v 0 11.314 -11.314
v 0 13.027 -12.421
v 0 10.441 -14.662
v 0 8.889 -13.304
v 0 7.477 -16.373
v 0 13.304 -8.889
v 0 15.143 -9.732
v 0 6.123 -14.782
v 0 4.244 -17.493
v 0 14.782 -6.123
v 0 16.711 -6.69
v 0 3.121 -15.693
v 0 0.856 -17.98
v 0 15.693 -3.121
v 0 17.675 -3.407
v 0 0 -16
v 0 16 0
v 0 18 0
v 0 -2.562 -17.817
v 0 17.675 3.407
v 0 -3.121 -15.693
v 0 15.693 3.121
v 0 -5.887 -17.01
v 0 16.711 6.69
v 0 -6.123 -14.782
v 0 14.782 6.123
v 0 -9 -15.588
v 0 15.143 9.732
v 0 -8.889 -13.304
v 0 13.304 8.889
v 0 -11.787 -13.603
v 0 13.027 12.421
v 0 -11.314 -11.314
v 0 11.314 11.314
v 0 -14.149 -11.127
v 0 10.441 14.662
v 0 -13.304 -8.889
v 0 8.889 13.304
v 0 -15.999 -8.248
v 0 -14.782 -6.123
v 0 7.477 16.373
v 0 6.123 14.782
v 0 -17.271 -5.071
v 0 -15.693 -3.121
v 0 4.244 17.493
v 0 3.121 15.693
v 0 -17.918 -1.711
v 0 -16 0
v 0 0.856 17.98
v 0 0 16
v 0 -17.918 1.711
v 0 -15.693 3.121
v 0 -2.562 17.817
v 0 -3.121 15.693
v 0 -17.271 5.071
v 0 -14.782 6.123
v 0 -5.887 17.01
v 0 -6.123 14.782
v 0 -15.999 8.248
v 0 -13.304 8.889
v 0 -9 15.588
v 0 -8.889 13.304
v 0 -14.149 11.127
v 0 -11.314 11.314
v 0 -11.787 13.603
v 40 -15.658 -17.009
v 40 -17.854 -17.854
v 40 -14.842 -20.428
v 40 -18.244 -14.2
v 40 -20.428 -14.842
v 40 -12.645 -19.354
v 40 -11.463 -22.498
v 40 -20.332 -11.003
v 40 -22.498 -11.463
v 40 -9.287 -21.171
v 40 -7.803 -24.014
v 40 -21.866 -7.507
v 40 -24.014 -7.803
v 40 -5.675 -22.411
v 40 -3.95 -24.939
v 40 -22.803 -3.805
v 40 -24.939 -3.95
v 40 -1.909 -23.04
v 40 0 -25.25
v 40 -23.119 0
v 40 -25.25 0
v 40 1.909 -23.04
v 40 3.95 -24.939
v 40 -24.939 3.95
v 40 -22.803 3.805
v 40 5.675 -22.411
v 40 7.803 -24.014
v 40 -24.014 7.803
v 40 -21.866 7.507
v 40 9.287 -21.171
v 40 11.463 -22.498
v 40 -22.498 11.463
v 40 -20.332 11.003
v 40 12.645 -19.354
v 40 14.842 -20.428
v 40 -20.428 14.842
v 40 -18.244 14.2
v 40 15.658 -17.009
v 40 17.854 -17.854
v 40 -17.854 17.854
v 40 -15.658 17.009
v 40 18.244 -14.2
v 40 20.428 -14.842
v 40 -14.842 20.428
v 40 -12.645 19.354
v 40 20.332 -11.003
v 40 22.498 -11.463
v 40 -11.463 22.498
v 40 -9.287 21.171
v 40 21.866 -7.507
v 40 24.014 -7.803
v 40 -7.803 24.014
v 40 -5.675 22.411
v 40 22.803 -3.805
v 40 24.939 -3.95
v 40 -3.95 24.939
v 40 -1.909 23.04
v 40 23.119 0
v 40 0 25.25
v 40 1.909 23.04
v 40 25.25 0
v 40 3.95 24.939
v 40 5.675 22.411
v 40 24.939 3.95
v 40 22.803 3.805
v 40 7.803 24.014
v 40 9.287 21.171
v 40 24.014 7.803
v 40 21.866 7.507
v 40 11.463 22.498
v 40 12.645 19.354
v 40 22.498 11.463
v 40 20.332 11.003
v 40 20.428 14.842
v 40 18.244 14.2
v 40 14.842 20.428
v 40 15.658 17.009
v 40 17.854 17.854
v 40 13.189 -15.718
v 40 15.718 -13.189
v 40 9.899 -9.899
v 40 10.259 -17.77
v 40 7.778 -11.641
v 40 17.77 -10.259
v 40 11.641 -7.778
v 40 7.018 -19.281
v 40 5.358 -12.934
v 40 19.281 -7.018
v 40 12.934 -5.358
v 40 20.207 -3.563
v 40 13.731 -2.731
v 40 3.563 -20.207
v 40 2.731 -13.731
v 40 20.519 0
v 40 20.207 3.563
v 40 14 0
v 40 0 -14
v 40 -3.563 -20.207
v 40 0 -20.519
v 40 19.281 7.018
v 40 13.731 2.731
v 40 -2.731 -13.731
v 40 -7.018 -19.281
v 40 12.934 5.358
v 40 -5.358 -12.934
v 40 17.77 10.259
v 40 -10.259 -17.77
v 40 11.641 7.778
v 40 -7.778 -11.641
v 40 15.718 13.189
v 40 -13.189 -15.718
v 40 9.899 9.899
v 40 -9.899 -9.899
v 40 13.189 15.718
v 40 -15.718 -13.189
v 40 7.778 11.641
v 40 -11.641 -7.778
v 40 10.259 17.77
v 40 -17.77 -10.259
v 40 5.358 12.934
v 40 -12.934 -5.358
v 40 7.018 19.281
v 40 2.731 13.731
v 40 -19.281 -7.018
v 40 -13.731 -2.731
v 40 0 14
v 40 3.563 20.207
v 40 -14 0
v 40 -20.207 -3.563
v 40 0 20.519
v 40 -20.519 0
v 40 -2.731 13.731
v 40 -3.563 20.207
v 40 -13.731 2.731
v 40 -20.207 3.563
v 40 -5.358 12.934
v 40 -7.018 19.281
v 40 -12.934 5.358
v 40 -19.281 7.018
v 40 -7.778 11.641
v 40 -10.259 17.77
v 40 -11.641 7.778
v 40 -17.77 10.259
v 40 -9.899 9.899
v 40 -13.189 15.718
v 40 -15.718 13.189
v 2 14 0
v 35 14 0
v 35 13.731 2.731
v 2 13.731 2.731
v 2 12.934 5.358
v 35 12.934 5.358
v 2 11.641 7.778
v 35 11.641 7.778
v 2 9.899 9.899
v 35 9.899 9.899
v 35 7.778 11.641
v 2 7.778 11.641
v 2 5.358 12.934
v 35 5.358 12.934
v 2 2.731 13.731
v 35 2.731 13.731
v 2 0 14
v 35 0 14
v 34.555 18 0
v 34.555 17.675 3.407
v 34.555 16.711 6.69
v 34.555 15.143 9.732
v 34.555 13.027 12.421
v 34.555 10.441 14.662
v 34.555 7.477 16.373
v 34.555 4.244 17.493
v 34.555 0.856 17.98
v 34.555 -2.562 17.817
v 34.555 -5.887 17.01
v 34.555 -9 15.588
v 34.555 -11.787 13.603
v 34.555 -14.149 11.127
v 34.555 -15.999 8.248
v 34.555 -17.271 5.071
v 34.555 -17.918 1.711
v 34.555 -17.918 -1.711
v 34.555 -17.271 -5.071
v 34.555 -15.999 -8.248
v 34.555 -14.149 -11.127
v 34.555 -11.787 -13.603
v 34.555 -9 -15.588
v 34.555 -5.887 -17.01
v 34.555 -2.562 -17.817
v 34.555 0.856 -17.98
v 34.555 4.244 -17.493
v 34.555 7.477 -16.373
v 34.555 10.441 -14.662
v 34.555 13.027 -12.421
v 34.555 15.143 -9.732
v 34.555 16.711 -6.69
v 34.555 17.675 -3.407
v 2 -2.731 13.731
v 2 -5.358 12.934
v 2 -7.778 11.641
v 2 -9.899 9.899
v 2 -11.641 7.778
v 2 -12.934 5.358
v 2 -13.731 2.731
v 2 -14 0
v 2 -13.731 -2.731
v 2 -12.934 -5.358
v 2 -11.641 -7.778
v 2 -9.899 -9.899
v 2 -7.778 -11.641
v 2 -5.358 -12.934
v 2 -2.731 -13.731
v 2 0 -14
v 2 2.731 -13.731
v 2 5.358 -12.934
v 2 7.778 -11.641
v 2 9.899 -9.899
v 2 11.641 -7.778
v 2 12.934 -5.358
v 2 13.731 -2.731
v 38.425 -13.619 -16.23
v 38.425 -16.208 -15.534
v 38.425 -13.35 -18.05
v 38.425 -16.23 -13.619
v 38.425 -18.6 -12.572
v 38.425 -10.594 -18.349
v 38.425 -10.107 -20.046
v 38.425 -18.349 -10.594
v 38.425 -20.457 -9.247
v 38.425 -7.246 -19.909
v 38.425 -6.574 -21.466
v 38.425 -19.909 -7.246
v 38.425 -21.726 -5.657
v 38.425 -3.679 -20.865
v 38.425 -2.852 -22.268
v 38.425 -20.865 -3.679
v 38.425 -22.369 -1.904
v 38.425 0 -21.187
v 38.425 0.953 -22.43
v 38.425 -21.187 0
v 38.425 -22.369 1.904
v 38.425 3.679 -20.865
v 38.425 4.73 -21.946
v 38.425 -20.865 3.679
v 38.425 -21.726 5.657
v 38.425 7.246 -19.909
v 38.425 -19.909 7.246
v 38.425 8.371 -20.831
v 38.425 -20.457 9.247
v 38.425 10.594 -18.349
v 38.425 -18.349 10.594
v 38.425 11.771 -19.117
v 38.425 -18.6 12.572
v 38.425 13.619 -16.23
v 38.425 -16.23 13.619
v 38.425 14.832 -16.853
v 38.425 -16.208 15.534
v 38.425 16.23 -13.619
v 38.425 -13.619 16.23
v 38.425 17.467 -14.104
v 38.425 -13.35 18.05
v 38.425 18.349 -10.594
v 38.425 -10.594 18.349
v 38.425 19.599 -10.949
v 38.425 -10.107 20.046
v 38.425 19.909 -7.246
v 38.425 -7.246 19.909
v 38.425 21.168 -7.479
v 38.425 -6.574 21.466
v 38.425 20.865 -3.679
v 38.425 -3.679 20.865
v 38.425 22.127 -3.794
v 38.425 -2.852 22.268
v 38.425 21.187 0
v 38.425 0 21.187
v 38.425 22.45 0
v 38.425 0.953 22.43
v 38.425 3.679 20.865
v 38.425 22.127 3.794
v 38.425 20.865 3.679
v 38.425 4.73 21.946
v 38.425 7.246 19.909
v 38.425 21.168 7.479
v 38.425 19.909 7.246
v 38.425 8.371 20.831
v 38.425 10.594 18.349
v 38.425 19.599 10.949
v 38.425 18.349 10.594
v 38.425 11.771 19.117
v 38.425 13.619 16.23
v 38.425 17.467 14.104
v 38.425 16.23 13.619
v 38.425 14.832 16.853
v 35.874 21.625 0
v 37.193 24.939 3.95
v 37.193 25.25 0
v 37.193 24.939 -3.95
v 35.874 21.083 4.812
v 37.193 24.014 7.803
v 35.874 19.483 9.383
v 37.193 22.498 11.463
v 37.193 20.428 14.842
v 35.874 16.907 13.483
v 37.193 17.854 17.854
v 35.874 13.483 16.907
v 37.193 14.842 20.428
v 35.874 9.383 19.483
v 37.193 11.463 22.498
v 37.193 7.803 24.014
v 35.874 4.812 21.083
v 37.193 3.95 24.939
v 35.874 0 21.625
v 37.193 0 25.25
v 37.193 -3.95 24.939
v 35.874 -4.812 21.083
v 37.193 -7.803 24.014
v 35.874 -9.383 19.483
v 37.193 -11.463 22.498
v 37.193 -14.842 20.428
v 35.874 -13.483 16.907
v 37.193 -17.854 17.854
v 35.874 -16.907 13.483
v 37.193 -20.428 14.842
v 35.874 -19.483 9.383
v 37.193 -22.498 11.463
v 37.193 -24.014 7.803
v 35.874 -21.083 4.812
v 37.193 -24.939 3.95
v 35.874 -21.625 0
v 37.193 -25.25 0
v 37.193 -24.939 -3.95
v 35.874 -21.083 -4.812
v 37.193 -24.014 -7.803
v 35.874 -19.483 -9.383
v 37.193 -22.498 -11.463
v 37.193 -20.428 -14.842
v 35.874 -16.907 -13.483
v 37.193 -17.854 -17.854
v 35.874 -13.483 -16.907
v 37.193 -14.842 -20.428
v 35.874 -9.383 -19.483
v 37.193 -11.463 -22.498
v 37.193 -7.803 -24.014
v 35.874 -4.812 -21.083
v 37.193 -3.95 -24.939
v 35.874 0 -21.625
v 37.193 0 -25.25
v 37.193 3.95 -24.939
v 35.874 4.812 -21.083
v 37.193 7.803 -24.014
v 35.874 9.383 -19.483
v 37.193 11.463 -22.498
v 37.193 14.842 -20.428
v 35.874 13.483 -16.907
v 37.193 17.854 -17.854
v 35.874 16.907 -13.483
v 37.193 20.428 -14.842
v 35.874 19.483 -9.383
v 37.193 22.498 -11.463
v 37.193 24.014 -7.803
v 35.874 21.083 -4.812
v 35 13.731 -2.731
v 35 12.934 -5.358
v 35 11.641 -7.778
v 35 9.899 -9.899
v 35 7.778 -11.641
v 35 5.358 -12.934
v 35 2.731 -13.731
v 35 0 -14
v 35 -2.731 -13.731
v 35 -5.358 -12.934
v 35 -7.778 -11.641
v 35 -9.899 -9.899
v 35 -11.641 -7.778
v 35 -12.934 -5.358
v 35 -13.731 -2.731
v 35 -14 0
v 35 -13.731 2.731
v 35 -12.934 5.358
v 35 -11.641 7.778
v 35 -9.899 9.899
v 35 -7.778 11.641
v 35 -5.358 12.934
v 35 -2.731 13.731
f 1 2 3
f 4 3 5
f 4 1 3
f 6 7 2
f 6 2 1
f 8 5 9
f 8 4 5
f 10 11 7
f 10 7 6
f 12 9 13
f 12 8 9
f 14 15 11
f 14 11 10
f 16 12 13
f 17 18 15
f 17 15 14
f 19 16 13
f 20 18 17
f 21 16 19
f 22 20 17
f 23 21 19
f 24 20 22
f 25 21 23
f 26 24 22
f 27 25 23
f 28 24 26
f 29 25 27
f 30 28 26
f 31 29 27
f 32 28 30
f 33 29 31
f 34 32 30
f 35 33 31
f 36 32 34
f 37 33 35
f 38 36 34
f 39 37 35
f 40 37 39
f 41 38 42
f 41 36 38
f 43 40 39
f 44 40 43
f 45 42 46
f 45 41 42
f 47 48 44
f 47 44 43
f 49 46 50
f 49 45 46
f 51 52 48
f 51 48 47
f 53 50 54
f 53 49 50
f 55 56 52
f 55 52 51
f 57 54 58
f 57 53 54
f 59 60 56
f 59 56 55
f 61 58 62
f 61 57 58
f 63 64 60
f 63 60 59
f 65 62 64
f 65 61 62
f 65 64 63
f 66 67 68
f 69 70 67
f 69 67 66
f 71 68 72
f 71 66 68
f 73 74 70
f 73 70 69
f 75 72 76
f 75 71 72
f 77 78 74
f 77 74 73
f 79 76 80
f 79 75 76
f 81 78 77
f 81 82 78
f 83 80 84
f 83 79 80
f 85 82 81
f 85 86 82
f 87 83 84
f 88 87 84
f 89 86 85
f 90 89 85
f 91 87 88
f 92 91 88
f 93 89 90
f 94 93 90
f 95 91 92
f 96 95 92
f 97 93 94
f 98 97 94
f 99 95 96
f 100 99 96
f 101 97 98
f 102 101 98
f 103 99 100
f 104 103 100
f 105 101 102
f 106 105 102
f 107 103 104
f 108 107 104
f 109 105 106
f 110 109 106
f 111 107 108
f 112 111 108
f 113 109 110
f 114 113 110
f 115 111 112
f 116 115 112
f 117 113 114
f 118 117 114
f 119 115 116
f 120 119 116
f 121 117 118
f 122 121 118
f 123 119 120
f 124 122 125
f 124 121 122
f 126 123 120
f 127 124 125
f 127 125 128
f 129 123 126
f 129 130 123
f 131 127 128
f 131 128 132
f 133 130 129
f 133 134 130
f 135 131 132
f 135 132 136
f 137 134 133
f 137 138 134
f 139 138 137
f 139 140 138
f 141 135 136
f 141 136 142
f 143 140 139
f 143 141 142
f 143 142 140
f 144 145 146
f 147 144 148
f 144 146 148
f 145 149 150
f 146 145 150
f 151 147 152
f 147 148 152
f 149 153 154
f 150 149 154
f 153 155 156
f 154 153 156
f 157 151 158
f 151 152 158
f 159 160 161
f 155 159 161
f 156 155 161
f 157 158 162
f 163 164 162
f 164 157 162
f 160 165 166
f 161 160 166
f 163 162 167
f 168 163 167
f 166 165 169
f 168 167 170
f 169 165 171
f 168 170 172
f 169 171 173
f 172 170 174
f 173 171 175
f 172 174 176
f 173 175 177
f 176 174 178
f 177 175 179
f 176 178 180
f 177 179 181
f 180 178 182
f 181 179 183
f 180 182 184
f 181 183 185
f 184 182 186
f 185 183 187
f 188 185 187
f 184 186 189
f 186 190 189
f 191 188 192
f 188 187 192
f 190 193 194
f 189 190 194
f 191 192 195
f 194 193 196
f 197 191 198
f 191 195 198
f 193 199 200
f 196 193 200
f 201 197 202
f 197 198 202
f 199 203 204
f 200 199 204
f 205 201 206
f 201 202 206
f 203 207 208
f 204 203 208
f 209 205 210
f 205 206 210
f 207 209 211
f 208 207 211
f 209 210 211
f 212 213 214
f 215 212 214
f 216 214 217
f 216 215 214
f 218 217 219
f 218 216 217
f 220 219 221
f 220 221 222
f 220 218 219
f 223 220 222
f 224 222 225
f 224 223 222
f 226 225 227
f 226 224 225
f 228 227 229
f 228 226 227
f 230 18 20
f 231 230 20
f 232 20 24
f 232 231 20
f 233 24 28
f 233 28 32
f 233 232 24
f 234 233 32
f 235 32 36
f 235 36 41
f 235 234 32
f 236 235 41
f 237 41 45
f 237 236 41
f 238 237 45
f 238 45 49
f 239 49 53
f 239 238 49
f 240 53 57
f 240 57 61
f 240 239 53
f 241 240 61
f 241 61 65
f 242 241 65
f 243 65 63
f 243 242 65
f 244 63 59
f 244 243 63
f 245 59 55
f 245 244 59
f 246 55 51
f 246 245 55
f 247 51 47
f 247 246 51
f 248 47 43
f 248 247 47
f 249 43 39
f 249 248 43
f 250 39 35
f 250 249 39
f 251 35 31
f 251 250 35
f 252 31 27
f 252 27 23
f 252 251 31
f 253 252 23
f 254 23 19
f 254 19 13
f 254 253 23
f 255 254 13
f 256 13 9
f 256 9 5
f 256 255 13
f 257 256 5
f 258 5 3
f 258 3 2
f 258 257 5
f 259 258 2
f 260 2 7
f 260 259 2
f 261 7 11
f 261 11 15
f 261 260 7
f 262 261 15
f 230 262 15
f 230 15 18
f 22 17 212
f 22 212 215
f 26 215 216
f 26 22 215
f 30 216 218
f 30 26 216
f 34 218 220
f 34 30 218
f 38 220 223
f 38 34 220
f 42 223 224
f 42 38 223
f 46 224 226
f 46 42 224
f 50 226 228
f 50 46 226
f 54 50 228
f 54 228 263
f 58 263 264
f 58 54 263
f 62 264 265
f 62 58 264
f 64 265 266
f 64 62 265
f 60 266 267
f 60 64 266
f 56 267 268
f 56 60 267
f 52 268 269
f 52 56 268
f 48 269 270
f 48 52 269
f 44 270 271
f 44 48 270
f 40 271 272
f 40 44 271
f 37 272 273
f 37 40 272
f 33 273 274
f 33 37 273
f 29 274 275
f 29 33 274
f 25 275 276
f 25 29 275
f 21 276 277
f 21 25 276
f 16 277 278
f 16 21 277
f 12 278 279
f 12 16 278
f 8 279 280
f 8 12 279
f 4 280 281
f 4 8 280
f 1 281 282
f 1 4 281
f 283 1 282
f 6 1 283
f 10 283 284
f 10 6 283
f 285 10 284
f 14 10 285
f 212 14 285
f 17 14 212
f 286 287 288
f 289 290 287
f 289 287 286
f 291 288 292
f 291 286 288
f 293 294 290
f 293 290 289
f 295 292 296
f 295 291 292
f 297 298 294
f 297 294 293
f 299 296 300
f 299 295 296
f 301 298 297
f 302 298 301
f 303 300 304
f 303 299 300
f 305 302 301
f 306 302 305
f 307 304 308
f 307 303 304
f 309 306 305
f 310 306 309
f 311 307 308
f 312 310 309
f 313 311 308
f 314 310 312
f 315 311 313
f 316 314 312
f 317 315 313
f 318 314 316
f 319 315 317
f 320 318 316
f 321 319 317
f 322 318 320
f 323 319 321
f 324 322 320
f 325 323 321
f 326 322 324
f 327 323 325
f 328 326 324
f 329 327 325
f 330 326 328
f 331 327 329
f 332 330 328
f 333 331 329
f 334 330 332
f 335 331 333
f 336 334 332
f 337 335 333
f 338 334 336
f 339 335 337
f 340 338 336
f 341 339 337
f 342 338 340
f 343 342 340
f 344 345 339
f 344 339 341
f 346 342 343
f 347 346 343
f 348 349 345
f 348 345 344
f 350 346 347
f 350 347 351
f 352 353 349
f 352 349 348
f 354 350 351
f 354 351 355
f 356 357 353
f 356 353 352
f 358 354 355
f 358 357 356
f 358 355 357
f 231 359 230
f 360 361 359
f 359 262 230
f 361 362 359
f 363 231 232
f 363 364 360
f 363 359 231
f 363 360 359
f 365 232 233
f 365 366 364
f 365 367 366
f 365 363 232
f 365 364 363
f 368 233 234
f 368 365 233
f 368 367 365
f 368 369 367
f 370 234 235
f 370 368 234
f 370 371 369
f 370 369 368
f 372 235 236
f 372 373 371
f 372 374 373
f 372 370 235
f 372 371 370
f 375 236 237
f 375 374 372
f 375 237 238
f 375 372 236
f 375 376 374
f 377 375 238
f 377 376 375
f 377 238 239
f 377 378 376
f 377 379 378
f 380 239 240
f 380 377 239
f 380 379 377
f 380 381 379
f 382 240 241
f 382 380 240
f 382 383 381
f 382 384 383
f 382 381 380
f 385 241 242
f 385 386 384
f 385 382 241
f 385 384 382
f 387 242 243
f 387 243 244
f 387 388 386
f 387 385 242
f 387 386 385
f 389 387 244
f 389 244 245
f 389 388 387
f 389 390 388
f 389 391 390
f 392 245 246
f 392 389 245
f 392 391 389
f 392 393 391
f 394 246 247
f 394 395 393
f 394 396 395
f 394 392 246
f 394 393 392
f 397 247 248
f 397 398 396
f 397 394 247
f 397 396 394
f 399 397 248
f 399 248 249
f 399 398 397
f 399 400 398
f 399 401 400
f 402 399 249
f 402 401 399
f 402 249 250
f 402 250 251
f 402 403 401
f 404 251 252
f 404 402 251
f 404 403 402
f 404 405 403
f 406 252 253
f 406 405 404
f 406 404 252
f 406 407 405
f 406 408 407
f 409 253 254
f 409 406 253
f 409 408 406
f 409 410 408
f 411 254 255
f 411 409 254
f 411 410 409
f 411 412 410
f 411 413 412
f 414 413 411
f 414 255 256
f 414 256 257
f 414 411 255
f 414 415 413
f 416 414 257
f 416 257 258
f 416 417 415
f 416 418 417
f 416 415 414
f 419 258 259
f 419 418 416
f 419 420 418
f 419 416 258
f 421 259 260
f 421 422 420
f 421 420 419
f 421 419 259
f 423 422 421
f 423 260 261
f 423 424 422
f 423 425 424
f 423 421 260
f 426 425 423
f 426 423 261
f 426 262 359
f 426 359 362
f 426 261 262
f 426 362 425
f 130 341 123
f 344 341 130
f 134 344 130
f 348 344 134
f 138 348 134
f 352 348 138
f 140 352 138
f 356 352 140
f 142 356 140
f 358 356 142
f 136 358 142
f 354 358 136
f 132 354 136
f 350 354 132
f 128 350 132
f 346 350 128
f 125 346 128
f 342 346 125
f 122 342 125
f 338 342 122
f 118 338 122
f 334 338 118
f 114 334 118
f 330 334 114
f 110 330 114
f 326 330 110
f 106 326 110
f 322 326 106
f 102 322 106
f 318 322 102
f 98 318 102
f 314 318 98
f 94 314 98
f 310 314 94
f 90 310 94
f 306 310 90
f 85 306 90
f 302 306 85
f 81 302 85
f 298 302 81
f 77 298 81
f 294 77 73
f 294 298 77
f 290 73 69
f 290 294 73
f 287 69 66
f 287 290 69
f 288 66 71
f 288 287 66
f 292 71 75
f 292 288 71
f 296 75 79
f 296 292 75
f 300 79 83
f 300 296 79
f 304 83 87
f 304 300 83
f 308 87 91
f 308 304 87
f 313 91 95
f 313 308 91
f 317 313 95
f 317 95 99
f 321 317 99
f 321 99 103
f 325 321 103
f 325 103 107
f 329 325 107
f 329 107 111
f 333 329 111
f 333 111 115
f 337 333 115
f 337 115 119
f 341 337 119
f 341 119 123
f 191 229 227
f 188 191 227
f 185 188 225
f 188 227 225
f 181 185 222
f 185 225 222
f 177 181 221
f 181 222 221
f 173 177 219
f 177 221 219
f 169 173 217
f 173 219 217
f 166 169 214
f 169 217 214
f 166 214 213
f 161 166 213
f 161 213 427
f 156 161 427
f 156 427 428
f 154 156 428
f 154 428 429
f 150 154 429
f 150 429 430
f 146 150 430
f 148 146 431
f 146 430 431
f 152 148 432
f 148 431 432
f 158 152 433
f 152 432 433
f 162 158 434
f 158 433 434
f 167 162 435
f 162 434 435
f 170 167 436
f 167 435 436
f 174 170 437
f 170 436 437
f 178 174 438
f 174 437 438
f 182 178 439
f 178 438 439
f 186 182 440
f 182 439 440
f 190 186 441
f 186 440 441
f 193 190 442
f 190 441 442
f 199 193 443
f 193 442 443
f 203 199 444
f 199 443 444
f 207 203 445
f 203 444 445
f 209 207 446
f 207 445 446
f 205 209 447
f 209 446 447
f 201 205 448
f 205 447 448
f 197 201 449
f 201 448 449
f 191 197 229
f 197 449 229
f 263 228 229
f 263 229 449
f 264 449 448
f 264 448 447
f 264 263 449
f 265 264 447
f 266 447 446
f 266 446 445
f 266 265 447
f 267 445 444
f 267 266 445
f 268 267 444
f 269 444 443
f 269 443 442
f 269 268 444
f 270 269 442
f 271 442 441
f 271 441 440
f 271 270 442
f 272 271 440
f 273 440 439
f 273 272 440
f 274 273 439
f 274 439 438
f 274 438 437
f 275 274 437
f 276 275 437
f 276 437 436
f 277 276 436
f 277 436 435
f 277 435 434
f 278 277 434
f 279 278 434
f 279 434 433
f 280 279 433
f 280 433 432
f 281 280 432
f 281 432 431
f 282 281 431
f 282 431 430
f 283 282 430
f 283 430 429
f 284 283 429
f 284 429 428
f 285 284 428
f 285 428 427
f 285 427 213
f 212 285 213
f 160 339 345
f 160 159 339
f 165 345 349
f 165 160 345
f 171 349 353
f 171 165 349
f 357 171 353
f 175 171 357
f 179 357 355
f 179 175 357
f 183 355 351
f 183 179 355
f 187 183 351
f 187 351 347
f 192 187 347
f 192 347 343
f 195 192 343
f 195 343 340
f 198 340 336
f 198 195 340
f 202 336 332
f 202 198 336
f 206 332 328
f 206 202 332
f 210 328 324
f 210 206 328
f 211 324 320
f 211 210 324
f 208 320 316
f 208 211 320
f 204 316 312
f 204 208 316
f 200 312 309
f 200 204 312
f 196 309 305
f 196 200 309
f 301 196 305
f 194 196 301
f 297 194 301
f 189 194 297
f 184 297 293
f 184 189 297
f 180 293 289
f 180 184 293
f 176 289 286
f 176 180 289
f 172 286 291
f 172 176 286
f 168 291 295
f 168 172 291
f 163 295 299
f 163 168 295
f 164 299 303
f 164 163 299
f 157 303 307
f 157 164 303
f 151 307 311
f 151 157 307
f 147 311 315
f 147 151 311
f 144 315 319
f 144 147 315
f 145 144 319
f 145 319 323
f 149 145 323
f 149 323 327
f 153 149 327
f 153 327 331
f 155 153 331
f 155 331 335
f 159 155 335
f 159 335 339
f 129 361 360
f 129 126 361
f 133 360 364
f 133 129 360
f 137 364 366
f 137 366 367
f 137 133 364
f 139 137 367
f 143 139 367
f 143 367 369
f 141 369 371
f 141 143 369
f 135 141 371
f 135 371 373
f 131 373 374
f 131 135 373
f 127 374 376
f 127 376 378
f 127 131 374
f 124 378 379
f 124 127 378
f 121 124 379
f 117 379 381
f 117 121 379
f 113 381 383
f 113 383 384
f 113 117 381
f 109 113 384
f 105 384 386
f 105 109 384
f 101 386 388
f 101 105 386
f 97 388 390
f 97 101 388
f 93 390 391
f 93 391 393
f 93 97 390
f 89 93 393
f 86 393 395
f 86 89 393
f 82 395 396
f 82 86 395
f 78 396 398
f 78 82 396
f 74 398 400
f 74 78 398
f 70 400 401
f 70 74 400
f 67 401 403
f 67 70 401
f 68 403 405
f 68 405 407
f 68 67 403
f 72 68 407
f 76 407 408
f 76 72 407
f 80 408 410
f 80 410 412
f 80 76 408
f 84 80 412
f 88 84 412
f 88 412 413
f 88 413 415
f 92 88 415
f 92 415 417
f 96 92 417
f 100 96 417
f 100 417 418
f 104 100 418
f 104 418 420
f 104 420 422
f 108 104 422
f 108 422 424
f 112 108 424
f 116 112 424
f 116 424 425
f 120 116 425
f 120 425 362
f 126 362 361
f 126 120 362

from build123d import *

# Parameters (mm, degrees)
CHAMFER1_SIZE      = 2
SKETCH7_R          = 14
CUT_EXTRUDE2_DEPTH = 41


with BuildPart() as part:
    # Sketch1 → Revolve1 (revolve)
    with BuildSketch(Plane.XY):
        Polygon((34.554515802, 18), (37.1933, 25.25), (40, 25.25), (40, 23.1186), (38.4252, 22.450137059), (38.4252, 21.187062941), (40, 20.5186), (40, 14), (40, 12), (35, 12), (35, 14), (0, 14), (0, 18), align=None)
    revolve(axis=Axis((0, 0, 0), (1, 0, 0)))

    # Chamfer1
    chamfer1_edges = [part.edges().sort_by_distance(p)[0] for p in [
        (0, -14, 0),
    ]]
    chamfer(chamfer1_edges, length=CHAMFER1_SIZE)

    # Sketch7 → Cut-Extrude2 (cut, through all)
    with BuildSketch(Plane.ZY):
        Circle(SKETCH7_R)
    extrude(amount=-CUT_EXTRUDE2_DEPTH, mode=Mode.SUBTRACT)


solid = part.part
